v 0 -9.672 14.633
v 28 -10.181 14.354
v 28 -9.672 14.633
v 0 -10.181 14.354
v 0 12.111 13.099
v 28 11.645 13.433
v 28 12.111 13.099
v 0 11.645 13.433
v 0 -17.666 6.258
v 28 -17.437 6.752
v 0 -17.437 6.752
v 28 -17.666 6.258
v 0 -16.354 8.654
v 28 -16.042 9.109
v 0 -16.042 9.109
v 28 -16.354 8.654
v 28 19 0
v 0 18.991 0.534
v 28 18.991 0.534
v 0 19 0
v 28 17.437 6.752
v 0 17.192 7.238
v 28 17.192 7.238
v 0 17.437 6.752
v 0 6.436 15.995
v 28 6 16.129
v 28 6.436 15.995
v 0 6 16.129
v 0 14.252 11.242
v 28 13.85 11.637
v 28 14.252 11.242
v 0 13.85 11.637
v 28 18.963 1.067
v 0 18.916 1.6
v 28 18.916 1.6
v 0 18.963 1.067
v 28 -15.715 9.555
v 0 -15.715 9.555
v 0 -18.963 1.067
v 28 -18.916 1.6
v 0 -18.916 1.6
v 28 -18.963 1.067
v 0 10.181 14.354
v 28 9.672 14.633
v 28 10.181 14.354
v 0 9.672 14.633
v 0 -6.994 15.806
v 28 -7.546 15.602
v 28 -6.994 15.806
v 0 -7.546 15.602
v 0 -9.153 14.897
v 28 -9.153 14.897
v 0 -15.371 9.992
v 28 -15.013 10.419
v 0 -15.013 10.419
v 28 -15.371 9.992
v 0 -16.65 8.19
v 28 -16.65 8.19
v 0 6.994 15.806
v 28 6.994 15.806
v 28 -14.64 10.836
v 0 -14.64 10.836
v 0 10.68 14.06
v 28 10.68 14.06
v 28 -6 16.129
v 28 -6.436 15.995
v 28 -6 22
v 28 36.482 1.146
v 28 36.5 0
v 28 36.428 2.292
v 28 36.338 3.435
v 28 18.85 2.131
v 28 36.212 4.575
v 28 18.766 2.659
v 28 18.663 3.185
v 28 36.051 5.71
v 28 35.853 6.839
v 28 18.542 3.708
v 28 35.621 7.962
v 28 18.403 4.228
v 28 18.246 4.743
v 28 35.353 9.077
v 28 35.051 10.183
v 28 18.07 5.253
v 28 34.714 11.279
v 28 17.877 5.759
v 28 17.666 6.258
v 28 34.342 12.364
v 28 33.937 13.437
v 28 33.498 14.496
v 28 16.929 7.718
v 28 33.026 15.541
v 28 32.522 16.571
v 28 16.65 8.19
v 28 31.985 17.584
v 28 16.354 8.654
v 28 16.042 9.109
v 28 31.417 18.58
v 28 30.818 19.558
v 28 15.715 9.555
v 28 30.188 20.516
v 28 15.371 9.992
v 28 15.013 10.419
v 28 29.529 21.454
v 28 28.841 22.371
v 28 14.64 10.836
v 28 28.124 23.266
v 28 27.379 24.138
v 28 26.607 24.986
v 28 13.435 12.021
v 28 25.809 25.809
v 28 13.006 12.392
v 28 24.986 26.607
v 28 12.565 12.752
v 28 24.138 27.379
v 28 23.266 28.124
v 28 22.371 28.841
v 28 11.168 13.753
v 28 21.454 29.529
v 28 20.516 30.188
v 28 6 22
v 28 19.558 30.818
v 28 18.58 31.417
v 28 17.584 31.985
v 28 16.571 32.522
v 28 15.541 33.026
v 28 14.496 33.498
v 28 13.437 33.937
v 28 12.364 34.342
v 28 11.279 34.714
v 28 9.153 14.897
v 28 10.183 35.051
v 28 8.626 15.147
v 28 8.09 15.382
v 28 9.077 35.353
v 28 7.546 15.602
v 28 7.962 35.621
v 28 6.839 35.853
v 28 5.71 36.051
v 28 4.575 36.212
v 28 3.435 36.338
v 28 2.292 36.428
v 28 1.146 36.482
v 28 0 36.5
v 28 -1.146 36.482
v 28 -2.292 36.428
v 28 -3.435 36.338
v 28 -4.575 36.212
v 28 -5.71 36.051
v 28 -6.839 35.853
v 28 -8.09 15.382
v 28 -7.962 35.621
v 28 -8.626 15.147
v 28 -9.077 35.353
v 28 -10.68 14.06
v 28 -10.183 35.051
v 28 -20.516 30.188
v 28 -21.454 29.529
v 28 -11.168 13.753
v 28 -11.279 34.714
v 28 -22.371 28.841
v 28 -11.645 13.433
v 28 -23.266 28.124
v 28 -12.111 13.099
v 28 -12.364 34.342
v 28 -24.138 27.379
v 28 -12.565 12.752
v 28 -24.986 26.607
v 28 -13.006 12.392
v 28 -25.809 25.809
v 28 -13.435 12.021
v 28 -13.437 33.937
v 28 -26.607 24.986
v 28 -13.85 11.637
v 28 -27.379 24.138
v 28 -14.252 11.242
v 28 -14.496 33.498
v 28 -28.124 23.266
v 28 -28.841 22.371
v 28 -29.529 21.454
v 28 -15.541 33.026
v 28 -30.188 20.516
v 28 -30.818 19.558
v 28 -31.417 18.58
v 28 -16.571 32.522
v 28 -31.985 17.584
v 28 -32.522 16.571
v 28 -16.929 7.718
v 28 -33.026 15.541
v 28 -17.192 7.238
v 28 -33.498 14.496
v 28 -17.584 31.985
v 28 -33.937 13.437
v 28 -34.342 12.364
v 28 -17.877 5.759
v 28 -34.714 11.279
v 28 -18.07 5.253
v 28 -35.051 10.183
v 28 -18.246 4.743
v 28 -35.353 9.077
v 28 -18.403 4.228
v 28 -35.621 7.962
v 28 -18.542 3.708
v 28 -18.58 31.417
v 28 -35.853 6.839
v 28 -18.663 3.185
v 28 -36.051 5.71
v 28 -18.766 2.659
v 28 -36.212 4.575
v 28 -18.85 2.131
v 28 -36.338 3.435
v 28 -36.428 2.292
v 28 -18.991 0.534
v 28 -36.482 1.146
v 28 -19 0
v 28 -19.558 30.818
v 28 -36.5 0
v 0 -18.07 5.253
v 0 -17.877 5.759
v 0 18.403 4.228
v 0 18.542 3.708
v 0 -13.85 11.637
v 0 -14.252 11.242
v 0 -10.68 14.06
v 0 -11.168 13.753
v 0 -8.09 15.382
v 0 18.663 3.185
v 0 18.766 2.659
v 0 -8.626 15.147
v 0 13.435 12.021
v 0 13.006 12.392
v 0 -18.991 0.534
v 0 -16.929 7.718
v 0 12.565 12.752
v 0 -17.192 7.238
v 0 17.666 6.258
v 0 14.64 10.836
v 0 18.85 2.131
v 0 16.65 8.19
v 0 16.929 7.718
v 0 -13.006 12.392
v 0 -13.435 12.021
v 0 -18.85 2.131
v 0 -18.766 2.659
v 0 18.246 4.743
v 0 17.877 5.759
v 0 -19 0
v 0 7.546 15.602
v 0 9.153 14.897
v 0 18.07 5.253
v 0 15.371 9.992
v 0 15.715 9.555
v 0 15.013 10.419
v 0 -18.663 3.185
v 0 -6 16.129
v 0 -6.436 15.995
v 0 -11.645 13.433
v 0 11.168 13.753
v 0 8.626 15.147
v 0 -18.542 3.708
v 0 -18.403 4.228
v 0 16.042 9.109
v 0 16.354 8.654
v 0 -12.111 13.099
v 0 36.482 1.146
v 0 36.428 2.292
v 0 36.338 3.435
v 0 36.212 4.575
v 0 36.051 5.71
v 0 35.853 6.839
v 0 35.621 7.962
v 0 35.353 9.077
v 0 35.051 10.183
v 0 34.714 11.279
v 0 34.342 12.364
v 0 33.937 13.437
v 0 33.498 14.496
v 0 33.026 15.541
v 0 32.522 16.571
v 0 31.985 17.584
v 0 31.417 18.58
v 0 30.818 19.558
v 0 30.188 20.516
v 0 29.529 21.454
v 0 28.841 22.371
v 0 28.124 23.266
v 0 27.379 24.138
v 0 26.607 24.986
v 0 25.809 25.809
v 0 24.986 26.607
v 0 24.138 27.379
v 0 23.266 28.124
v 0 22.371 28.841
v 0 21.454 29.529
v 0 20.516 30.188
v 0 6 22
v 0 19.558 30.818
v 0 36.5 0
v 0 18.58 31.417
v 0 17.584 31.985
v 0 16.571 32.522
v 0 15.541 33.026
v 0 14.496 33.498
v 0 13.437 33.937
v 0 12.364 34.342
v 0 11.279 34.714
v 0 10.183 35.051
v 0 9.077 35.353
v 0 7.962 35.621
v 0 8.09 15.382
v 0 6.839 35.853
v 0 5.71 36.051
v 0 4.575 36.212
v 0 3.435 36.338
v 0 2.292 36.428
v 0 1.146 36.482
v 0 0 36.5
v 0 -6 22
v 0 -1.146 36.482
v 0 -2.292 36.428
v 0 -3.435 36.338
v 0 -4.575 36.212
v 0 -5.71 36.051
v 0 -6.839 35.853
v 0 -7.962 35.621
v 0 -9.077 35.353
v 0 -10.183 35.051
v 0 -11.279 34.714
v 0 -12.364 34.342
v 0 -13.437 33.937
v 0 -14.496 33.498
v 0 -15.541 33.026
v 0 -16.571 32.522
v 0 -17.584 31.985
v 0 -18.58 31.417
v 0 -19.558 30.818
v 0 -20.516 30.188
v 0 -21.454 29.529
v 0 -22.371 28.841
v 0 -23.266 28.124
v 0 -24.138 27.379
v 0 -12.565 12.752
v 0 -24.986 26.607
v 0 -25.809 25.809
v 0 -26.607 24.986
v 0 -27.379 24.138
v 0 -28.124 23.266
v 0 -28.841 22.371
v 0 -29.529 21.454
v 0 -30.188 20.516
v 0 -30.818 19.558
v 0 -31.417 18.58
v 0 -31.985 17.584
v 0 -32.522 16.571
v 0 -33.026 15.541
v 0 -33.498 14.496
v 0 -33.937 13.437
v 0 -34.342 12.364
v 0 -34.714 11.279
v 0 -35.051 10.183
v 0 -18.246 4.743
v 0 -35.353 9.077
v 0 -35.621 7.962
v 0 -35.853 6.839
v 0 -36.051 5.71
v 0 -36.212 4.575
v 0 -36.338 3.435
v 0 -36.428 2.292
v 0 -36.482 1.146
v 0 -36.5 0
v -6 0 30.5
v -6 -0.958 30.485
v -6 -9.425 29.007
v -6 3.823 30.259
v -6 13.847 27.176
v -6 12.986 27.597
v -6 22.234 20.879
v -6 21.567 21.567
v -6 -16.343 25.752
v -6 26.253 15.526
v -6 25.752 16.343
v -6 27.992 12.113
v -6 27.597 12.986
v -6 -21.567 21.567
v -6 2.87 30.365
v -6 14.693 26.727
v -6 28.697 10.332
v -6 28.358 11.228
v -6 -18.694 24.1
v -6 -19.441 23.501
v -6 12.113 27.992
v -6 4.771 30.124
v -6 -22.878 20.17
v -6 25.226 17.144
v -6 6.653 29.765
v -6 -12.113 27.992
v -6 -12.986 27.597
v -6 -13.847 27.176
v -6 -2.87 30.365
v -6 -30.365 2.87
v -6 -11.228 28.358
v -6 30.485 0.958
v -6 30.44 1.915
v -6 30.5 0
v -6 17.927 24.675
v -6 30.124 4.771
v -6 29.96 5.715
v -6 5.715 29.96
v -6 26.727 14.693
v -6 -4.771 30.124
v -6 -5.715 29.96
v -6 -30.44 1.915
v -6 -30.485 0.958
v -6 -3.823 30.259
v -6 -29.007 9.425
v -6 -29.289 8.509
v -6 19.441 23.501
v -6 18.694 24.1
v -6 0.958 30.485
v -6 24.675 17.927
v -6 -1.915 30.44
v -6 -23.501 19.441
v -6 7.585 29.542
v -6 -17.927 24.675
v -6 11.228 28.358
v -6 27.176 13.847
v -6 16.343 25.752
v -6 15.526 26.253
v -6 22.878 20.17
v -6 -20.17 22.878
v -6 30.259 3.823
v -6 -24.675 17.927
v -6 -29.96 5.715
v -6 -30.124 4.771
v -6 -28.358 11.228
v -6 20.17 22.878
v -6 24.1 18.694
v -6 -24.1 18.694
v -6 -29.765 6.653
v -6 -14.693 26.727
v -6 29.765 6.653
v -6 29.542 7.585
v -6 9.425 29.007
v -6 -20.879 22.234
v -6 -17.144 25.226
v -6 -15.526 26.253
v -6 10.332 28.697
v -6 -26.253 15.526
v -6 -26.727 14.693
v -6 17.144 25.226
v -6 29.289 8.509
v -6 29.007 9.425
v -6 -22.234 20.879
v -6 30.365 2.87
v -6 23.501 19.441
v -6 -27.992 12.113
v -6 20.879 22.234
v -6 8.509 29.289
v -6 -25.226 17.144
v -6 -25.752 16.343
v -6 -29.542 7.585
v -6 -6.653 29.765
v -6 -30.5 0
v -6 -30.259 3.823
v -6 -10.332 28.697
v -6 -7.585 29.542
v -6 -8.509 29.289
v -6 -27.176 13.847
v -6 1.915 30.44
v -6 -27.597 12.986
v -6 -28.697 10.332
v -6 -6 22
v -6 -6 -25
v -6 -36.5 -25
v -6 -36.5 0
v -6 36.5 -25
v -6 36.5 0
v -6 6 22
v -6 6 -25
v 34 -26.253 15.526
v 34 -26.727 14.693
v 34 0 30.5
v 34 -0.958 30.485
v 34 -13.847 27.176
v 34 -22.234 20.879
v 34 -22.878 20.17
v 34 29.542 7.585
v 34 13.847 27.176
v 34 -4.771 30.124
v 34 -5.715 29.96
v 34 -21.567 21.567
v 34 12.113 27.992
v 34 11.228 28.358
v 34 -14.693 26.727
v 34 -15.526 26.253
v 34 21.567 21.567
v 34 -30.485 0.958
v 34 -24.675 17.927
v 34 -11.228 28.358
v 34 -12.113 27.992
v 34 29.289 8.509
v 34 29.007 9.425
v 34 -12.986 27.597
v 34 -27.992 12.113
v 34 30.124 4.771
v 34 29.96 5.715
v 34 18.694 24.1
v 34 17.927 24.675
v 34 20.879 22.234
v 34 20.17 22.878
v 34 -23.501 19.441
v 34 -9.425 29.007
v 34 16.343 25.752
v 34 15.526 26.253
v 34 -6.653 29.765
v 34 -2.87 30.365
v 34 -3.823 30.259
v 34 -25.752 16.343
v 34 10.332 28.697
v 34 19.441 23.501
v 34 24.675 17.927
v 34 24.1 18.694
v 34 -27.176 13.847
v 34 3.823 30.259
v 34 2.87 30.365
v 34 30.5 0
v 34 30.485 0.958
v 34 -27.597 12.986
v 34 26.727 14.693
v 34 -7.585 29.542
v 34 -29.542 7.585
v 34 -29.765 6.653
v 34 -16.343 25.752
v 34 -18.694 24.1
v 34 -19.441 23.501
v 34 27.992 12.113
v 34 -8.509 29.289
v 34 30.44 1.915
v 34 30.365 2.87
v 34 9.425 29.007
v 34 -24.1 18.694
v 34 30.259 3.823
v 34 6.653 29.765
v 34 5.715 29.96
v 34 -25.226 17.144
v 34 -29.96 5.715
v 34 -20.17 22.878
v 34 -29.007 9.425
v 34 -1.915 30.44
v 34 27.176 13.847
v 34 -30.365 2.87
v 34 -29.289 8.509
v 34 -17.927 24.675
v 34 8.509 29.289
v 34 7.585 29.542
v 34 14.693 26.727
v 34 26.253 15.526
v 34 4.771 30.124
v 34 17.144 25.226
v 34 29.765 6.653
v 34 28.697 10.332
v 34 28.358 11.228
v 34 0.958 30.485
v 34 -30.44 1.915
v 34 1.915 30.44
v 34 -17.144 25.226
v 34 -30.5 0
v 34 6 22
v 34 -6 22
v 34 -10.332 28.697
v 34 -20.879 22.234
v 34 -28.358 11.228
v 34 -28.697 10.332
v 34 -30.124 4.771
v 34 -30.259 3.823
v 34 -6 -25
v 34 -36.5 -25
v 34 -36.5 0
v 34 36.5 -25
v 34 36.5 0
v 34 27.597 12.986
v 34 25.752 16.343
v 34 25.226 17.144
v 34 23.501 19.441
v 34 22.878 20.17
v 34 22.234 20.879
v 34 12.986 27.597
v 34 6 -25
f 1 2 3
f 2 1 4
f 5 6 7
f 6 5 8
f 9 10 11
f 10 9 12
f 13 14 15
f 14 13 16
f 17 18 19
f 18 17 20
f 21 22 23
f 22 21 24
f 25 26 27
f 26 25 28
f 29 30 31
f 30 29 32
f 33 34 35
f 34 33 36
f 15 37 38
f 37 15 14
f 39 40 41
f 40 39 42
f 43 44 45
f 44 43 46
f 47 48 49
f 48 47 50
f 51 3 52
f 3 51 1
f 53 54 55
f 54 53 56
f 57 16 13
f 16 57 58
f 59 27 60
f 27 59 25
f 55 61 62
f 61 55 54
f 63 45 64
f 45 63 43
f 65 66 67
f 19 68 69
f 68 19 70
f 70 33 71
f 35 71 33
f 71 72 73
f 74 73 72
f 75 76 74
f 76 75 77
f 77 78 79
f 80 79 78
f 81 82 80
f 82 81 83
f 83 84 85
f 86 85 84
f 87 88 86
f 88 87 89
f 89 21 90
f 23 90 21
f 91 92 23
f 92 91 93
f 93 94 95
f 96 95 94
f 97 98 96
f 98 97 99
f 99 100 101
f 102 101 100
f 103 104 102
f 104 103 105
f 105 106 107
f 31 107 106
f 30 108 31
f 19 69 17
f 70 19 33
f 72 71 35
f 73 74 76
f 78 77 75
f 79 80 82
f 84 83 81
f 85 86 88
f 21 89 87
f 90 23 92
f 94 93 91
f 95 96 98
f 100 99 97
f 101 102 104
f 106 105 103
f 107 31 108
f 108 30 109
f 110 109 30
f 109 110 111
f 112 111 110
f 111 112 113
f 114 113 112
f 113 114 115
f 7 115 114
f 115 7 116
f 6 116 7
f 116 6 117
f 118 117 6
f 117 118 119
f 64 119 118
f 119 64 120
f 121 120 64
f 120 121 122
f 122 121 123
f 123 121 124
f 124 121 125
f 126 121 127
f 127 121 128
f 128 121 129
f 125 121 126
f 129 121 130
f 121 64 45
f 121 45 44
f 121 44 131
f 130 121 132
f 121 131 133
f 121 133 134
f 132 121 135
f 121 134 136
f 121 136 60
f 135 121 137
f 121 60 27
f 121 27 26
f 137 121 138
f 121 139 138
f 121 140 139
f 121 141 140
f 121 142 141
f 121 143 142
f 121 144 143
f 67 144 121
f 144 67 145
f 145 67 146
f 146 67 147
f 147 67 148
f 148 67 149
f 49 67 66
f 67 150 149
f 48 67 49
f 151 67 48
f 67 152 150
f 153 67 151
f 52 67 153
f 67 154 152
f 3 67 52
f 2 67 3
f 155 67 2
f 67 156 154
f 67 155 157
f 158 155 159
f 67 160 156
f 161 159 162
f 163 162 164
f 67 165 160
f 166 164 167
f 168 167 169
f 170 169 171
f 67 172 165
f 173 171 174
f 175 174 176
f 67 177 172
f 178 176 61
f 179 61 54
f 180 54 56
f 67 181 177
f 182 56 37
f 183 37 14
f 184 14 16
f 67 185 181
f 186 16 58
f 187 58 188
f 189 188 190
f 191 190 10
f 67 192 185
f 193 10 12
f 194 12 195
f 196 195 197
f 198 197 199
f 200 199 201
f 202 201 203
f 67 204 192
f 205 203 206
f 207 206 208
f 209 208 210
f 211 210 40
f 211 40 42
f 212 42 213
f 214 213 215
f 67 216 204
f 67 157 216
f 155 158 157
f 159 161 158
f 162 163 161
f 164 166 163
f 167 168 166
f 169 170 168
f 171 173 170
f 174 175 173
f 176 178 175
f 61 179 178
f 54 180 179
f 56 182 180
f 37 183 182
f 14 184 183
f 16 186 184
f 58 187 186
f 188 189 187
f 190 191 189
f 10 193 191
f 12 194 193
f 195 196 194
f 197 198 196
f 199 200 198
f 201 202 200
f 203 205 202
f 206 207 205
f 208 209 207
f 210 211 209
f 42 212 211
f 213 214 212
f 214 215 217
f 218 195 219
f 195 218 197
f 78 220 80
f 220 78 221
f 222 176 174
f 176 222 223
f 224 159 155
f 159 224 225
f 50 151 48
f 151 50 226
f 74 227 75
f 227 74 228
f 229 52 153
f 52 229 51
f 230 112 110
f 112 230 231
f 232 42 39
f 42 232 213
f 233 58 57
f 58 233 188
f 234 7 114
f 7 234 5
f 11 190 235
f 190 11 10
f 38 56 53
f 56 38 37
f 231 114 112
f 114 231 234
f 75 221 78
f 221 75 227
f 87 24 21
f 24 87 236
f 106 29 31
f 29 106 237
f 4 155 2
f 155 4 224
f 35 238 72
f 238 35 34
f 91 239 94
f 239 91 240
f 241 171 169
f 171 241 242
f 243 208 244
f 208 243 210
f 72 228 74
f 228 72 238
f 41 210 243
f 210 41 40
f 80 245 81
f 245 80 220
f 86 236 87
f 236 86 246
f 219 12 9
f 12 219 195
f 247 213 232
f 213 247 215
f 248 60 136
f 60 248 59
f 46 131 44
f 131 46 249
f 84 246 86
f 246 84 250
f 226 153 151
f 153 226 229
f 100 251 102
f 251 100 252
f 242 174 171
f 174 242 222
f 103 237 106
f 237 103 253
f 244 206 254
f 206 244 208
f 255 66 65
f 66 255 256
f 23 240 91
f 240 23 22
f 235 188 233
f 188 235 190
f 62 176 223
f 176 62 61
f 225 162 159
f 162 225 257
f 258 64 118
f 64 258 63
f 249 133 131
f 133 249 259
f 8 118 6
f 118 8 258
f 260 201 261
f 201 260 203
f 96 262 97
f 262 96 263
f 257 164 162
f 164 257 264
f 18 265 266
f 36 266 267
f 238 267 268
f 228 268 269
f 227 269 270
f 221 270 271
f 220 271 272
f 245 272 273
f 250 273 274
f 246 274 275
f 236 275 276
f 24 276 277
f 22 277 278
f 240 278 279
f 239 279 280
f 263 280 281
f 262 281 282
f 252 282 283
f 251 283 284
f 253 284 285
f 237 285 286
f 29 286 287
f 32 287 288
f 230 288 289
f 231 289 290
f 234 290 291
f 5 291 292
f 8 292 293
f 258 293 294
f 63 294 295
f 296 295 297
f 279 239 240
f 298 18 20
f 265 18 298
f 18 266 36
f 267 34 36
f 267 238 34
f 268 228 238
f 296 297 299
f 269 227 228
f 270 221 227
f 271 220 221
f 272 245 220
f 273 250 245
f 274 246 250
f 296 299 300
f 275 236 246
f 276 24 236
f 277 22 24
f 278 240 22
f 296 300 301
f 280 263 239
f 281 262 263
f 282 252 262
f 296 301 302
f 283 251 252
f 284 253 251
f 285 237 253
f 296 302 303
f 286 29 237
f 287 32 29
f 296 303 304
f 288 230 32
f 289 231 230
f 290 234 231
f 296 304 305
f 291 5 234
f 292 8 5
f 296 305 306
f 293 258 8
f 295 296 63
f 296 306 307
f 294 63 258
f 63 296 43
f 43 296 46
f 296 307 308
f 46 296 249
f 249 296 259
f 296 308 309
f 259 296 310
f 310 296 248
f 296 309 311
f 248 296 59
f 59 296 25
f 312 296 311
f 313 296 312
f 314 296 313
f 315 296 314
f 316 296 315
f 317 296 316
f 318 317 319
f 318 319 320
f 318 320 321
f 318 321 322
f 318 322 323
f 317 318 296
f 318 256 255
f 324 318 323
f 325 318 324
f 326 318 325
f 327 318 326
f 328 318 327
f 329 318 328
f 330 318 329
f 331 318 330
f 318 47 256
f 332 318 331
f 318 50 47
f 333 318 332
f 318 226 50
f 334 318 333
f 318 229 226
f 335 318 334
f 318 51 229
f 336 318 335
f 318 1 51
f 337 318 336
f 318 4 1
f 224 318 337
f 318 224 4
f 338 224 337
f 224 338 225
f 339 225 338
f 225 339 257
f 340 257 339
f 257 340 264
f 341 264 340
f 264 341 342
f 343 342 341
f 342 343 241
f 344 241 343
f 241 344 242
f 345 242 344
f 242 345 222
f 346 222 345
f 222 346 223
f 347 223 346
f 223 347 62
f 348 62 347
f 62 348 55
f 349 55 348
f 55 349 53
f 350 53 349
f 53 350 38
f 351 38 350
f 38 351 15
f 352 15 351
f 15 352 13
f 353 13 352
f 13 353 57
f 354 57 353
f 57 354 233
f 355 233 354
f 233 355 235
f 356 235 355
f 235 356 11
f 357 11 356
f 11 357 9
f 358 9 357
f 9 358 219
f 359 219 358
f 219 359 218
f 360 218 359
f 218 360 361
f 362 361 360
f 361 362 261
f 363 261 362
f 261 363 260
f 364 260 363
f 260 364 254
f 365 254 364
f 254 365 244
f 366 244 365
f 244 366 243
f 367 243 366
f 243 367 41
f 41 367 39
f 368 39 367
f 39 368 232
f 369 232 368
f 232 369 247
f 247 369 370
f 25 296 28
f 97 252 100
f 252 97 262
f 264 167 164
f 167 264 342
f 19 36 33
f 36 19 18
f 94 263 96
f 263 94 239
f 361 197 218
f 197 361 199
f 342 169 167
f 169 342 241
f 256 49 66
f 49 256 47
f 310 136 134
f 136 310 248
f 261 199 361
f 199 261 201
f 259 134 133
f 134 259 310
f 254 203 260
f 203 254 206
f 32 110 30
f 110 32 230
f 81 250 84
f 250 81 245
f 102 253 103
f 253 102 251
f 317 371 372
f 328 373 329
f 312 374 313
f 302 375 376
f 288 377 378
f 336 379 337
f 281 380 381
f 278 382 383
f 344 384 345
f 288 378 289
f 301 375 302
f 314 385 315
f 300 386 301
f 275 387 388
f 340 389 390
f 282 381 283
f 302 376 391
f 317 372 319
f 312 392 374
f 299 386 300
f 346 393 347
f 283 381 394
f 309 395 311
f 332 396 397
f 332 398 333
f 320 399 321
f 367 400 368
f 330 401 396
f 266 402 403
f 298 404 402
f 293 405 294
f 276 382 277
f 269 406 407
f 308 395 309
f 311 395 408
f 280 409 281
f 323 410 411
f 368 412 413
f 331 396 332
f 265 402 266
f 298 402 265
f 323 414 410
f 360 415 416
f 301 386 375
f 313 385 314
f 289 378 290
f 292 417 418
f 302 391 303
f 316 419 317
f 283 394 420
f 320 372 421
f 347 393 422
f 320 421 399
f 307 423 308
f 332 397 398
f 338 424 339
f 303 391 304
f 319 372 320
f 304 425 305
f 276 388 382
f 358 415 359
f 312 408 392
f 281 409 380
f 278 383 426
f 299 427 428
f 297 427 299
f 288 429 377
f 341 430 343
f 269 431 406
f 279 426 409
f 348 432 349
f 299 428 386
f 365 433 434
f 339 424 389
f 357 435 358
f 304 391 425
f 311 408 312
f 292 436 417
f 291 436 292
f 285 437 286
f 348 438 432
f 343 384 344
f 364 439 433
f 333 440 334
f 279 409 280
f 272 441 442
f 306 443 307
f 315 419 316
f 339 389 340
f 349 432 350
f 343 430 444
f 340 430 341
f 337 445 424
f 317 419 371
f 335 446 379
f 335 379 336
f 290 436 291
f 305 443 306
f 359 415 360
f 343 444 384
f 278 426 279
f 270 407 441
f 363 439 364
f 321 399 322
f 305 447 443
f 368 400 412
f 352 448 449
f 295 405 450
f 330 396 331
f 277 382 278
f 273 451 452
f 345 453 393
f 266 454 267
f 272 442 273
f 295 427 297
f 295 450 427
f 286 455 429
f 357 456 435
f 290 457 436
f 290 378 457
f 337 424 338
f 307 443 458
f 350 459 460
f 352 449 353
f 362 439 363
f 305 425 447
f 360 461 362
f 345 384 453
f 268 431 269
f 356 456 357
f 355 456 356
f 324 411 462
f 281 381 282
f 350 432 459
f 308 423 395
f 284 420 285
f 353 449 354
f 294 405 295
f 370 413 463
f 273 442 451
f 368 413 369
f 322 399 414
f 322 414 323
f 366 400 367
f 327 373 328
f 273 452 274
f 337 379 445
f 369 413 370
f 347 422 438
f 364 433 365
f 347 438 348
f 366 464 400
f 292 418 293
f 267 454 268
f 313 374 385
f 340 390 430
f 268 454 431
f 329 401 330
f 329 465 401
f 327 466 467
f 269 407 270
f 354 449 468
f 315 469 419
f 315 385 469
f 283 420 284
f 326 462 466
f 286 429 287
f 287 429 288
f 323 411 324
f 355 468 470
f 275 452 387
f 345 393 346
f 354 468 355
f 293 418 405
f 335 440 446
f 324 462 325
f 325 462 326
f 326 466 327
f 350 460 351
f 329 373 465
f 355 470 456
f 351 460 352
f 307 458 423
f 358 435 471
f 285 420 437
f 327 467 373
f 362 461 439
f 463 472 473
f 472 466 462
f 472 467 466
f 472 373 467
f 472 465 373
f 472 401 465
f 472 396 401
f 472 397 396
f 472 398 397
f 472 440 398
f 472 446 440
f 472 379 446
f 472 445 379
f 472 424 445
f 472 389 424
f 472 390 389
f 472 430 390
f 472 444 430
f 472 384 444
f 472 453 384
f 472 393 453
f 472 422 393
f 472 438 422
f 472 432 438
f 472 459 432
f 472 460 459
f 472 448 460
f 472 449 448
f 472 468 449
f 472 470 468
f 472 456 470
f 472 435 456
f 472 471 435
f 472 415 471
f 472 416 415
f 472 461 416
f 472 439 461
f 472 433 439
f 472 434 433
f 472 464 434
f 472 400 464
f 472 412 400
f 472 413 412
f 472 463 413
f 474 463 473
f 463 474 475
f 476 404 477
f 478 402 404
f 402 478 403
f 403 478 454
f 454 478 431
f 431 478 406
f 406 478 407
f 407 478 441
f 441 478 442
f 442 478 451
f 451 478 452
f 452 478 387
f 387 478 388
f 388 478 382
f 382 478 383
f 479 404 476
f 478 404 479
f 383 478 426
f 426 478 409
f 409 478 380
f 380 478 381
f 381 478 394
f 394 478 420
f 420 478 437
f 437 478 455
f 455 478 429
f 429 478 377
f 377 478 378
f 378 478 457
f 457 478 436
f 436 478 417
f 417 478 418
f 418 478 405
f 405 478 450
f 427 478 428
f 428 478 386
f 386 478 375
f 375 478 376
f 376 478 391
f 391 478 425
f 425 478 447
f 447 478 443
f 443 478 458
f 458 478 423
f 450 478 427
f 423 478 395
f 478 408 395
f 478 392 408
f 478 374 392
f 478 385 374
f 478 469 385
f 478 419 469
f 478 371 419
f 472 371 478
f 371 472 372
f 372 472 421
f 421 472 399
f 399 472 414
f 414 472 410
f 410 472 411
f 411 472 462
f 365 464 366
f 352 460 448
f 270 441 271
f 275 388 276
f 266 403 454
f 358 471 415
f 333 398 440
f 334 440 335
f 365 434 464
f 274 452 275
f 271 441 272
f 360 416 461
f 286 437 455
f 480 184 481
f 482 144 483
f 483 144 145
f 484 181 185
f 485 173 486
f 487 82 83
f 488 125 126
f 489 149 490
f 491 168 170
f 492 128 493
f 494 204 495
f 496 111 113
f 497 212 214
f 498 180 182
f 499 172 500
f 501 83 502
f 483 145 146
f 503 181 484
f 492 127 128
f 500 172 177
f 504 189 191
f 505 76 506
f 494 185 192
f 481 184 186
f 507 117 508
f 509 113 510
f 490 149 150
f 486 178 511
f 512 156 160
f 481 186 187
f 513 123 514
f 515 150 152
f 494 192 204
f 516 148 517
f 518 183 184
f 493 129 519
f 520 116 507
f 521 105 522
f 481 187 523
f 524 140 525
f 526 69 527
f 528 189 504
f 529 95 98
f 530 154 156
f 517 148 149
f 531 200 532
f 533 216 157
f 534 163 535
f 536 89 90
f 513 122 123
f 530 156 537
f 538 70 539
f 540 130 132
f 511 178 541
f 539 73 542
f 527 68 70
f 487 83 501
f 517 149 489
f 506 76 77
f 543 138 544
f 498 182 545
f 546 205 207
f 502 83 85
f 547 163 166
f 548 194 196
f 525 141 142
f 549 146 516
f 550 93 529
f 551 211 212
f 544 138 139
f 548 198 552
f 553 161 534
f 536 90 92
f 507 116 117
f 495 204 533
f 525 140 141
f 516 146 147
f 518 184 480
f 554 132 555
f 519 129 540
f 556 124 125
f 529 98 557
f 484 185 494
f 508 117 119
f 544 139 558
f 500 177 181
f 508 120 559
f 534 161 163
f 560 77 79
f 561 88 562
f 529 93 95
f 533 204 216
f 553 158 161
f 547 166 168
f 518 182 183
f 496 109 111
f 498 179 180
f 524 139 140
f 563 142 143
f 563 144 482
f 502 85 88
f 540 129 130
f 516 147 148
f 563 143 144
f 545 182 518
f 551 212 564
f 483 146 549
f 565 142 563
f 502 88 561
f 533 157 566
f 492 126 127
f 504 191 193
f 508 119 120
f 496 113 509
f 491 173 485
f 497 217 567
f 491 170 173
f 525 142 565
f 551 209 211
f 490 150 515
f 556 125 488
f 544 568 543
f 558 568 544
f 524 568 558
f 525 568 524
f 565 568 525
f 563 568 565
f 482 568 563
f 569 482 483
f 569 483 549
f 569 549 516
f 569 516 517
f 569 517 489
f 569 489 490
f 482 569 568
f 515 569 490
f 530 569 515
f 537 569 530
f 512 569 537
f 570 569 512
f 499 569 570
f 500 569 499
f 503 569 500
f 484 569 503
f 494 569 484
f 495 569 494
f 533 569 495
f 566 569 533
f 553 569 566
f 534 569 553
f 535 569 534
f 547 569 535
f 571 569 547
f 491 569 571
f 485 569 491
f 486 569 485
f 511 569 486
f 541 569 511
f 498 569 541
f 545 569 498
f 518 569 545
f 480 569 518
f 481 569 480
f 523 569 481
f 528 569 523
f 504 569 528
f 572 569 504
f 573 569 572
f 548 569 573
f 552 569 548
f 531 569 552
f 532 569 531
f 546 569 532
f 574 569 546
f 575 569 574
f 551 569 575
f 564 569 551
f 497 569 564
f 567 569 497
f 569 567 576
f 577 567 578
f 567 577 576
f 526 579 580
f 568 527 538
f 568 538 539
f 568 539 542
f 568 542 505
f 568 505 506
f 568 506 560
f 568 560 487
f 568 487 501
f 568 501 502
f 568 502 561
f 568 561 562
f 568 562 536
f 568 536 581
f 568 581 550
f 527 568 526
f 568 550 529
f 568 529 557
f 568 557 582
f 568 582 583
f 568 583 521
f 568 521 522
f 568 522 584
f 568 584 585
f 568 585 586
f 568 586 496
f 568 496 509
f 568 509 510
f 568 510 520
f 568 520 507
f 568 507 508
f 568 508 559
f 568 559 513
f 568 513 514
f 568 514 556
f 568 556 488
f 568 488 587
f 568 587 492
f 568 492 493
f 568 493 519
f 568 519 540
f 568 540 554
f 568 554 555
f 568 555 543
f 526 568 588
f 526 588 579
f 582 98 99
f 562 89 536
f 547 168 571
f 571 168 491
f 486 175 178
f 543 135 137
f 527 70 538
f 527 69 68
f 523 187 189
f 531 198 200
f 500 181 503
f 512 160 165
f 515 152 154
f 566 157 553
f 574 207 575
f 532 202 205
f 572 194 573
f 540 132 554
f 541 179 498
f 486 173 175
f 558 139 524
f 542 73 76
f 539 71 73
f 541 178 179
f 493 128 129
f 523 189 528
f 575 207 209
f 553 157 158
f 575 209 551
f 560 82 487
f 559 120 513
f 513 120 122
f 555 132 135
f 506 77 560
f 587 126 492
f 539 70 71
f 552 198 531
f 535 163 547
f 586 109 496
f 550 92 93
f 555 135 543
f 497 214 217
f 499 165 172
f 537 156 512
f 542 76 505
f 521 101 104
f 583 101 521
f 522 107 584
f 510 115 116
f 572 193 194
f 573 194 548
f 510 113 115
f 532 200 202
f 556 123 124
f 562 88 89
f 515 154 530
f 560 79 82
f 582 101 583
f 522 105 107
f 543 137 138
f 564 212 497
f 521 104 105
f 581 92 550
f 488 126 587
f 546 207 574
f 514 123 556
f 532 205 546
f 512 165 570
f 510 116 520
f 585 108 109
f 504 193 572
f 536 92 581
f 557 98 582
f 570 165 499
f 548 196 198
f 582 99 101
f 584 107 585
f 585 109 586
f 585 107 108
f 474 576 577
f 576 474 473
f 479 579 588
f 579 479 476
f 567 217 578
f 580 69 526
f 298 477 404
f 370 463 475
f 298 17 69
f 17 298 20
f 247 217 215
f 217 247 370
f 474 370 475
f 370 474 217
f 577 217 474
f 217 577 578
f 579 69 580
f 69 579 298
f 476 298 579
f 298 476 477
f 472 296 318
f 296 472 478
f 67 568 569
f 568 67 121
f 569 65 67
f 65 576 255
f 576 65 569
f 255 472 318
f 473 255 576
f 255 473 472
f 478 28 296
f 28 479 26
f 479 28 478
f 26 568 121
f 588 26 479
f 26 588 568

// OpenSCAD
groove=12;
groove_h=47;
// how wide the stand is
stand=28;

// flat section at top of the stand
platform=73;
// rounded part
cup_w=38;
cup_h=17*2;
// bottom groove in jack stand
bottom_groove=10;

pad=0.1;
padd=pad*2;

wall=6;
walll=wall*2;
$fn=200;
layer_h=0.4;
mouse_ears_wall=50;

module positive() {
    difference() {
        union() {
            //inner round
            scale([1,1,cup_h/cup_w])
            rotate([0,90,0])
            cylinder(d=cup_w,h=stand);

            //sides
            translate([-wall,0,0])
            rotate([0,90,0])
            cylinder(d2=platform,d1=platform-walll,h=wall);

            //sides
            translate([stand,0,0])
            rotate([0,90,0])
            cylinder(d1=platform,d2=platform-walll,h=wall);
        }
        // cut circle in half
        translate([-pad-wall,-platform/2,pad])
        cube([stand+walll+padd,platform,cup_w]);
    }
    // box
    translate([-wall,-platform/2,0])
    cube([stand+walll,platform,groove_h-cup_h/2-bottom_groove/2]);
}

module all() {
    difference() {
        positive();
        translate([-pad-wall,-groove/2,-cup_h/2-bottom_groove/2])
        cube([stand+walll+padd,groove,groove_h+pad]);
    }
    //raft();
}

module raft() {
    translate([-wall,-platform/2,groove_h-cup_h/2-bottom_groove/2])
    minkowski() {
        cylinder(d=mouse_ears_wall,h=layer_h/2);
        cube([stand+walll,platform,layer_h/2]);
    }
}
rotate([180,0,0])
all();
